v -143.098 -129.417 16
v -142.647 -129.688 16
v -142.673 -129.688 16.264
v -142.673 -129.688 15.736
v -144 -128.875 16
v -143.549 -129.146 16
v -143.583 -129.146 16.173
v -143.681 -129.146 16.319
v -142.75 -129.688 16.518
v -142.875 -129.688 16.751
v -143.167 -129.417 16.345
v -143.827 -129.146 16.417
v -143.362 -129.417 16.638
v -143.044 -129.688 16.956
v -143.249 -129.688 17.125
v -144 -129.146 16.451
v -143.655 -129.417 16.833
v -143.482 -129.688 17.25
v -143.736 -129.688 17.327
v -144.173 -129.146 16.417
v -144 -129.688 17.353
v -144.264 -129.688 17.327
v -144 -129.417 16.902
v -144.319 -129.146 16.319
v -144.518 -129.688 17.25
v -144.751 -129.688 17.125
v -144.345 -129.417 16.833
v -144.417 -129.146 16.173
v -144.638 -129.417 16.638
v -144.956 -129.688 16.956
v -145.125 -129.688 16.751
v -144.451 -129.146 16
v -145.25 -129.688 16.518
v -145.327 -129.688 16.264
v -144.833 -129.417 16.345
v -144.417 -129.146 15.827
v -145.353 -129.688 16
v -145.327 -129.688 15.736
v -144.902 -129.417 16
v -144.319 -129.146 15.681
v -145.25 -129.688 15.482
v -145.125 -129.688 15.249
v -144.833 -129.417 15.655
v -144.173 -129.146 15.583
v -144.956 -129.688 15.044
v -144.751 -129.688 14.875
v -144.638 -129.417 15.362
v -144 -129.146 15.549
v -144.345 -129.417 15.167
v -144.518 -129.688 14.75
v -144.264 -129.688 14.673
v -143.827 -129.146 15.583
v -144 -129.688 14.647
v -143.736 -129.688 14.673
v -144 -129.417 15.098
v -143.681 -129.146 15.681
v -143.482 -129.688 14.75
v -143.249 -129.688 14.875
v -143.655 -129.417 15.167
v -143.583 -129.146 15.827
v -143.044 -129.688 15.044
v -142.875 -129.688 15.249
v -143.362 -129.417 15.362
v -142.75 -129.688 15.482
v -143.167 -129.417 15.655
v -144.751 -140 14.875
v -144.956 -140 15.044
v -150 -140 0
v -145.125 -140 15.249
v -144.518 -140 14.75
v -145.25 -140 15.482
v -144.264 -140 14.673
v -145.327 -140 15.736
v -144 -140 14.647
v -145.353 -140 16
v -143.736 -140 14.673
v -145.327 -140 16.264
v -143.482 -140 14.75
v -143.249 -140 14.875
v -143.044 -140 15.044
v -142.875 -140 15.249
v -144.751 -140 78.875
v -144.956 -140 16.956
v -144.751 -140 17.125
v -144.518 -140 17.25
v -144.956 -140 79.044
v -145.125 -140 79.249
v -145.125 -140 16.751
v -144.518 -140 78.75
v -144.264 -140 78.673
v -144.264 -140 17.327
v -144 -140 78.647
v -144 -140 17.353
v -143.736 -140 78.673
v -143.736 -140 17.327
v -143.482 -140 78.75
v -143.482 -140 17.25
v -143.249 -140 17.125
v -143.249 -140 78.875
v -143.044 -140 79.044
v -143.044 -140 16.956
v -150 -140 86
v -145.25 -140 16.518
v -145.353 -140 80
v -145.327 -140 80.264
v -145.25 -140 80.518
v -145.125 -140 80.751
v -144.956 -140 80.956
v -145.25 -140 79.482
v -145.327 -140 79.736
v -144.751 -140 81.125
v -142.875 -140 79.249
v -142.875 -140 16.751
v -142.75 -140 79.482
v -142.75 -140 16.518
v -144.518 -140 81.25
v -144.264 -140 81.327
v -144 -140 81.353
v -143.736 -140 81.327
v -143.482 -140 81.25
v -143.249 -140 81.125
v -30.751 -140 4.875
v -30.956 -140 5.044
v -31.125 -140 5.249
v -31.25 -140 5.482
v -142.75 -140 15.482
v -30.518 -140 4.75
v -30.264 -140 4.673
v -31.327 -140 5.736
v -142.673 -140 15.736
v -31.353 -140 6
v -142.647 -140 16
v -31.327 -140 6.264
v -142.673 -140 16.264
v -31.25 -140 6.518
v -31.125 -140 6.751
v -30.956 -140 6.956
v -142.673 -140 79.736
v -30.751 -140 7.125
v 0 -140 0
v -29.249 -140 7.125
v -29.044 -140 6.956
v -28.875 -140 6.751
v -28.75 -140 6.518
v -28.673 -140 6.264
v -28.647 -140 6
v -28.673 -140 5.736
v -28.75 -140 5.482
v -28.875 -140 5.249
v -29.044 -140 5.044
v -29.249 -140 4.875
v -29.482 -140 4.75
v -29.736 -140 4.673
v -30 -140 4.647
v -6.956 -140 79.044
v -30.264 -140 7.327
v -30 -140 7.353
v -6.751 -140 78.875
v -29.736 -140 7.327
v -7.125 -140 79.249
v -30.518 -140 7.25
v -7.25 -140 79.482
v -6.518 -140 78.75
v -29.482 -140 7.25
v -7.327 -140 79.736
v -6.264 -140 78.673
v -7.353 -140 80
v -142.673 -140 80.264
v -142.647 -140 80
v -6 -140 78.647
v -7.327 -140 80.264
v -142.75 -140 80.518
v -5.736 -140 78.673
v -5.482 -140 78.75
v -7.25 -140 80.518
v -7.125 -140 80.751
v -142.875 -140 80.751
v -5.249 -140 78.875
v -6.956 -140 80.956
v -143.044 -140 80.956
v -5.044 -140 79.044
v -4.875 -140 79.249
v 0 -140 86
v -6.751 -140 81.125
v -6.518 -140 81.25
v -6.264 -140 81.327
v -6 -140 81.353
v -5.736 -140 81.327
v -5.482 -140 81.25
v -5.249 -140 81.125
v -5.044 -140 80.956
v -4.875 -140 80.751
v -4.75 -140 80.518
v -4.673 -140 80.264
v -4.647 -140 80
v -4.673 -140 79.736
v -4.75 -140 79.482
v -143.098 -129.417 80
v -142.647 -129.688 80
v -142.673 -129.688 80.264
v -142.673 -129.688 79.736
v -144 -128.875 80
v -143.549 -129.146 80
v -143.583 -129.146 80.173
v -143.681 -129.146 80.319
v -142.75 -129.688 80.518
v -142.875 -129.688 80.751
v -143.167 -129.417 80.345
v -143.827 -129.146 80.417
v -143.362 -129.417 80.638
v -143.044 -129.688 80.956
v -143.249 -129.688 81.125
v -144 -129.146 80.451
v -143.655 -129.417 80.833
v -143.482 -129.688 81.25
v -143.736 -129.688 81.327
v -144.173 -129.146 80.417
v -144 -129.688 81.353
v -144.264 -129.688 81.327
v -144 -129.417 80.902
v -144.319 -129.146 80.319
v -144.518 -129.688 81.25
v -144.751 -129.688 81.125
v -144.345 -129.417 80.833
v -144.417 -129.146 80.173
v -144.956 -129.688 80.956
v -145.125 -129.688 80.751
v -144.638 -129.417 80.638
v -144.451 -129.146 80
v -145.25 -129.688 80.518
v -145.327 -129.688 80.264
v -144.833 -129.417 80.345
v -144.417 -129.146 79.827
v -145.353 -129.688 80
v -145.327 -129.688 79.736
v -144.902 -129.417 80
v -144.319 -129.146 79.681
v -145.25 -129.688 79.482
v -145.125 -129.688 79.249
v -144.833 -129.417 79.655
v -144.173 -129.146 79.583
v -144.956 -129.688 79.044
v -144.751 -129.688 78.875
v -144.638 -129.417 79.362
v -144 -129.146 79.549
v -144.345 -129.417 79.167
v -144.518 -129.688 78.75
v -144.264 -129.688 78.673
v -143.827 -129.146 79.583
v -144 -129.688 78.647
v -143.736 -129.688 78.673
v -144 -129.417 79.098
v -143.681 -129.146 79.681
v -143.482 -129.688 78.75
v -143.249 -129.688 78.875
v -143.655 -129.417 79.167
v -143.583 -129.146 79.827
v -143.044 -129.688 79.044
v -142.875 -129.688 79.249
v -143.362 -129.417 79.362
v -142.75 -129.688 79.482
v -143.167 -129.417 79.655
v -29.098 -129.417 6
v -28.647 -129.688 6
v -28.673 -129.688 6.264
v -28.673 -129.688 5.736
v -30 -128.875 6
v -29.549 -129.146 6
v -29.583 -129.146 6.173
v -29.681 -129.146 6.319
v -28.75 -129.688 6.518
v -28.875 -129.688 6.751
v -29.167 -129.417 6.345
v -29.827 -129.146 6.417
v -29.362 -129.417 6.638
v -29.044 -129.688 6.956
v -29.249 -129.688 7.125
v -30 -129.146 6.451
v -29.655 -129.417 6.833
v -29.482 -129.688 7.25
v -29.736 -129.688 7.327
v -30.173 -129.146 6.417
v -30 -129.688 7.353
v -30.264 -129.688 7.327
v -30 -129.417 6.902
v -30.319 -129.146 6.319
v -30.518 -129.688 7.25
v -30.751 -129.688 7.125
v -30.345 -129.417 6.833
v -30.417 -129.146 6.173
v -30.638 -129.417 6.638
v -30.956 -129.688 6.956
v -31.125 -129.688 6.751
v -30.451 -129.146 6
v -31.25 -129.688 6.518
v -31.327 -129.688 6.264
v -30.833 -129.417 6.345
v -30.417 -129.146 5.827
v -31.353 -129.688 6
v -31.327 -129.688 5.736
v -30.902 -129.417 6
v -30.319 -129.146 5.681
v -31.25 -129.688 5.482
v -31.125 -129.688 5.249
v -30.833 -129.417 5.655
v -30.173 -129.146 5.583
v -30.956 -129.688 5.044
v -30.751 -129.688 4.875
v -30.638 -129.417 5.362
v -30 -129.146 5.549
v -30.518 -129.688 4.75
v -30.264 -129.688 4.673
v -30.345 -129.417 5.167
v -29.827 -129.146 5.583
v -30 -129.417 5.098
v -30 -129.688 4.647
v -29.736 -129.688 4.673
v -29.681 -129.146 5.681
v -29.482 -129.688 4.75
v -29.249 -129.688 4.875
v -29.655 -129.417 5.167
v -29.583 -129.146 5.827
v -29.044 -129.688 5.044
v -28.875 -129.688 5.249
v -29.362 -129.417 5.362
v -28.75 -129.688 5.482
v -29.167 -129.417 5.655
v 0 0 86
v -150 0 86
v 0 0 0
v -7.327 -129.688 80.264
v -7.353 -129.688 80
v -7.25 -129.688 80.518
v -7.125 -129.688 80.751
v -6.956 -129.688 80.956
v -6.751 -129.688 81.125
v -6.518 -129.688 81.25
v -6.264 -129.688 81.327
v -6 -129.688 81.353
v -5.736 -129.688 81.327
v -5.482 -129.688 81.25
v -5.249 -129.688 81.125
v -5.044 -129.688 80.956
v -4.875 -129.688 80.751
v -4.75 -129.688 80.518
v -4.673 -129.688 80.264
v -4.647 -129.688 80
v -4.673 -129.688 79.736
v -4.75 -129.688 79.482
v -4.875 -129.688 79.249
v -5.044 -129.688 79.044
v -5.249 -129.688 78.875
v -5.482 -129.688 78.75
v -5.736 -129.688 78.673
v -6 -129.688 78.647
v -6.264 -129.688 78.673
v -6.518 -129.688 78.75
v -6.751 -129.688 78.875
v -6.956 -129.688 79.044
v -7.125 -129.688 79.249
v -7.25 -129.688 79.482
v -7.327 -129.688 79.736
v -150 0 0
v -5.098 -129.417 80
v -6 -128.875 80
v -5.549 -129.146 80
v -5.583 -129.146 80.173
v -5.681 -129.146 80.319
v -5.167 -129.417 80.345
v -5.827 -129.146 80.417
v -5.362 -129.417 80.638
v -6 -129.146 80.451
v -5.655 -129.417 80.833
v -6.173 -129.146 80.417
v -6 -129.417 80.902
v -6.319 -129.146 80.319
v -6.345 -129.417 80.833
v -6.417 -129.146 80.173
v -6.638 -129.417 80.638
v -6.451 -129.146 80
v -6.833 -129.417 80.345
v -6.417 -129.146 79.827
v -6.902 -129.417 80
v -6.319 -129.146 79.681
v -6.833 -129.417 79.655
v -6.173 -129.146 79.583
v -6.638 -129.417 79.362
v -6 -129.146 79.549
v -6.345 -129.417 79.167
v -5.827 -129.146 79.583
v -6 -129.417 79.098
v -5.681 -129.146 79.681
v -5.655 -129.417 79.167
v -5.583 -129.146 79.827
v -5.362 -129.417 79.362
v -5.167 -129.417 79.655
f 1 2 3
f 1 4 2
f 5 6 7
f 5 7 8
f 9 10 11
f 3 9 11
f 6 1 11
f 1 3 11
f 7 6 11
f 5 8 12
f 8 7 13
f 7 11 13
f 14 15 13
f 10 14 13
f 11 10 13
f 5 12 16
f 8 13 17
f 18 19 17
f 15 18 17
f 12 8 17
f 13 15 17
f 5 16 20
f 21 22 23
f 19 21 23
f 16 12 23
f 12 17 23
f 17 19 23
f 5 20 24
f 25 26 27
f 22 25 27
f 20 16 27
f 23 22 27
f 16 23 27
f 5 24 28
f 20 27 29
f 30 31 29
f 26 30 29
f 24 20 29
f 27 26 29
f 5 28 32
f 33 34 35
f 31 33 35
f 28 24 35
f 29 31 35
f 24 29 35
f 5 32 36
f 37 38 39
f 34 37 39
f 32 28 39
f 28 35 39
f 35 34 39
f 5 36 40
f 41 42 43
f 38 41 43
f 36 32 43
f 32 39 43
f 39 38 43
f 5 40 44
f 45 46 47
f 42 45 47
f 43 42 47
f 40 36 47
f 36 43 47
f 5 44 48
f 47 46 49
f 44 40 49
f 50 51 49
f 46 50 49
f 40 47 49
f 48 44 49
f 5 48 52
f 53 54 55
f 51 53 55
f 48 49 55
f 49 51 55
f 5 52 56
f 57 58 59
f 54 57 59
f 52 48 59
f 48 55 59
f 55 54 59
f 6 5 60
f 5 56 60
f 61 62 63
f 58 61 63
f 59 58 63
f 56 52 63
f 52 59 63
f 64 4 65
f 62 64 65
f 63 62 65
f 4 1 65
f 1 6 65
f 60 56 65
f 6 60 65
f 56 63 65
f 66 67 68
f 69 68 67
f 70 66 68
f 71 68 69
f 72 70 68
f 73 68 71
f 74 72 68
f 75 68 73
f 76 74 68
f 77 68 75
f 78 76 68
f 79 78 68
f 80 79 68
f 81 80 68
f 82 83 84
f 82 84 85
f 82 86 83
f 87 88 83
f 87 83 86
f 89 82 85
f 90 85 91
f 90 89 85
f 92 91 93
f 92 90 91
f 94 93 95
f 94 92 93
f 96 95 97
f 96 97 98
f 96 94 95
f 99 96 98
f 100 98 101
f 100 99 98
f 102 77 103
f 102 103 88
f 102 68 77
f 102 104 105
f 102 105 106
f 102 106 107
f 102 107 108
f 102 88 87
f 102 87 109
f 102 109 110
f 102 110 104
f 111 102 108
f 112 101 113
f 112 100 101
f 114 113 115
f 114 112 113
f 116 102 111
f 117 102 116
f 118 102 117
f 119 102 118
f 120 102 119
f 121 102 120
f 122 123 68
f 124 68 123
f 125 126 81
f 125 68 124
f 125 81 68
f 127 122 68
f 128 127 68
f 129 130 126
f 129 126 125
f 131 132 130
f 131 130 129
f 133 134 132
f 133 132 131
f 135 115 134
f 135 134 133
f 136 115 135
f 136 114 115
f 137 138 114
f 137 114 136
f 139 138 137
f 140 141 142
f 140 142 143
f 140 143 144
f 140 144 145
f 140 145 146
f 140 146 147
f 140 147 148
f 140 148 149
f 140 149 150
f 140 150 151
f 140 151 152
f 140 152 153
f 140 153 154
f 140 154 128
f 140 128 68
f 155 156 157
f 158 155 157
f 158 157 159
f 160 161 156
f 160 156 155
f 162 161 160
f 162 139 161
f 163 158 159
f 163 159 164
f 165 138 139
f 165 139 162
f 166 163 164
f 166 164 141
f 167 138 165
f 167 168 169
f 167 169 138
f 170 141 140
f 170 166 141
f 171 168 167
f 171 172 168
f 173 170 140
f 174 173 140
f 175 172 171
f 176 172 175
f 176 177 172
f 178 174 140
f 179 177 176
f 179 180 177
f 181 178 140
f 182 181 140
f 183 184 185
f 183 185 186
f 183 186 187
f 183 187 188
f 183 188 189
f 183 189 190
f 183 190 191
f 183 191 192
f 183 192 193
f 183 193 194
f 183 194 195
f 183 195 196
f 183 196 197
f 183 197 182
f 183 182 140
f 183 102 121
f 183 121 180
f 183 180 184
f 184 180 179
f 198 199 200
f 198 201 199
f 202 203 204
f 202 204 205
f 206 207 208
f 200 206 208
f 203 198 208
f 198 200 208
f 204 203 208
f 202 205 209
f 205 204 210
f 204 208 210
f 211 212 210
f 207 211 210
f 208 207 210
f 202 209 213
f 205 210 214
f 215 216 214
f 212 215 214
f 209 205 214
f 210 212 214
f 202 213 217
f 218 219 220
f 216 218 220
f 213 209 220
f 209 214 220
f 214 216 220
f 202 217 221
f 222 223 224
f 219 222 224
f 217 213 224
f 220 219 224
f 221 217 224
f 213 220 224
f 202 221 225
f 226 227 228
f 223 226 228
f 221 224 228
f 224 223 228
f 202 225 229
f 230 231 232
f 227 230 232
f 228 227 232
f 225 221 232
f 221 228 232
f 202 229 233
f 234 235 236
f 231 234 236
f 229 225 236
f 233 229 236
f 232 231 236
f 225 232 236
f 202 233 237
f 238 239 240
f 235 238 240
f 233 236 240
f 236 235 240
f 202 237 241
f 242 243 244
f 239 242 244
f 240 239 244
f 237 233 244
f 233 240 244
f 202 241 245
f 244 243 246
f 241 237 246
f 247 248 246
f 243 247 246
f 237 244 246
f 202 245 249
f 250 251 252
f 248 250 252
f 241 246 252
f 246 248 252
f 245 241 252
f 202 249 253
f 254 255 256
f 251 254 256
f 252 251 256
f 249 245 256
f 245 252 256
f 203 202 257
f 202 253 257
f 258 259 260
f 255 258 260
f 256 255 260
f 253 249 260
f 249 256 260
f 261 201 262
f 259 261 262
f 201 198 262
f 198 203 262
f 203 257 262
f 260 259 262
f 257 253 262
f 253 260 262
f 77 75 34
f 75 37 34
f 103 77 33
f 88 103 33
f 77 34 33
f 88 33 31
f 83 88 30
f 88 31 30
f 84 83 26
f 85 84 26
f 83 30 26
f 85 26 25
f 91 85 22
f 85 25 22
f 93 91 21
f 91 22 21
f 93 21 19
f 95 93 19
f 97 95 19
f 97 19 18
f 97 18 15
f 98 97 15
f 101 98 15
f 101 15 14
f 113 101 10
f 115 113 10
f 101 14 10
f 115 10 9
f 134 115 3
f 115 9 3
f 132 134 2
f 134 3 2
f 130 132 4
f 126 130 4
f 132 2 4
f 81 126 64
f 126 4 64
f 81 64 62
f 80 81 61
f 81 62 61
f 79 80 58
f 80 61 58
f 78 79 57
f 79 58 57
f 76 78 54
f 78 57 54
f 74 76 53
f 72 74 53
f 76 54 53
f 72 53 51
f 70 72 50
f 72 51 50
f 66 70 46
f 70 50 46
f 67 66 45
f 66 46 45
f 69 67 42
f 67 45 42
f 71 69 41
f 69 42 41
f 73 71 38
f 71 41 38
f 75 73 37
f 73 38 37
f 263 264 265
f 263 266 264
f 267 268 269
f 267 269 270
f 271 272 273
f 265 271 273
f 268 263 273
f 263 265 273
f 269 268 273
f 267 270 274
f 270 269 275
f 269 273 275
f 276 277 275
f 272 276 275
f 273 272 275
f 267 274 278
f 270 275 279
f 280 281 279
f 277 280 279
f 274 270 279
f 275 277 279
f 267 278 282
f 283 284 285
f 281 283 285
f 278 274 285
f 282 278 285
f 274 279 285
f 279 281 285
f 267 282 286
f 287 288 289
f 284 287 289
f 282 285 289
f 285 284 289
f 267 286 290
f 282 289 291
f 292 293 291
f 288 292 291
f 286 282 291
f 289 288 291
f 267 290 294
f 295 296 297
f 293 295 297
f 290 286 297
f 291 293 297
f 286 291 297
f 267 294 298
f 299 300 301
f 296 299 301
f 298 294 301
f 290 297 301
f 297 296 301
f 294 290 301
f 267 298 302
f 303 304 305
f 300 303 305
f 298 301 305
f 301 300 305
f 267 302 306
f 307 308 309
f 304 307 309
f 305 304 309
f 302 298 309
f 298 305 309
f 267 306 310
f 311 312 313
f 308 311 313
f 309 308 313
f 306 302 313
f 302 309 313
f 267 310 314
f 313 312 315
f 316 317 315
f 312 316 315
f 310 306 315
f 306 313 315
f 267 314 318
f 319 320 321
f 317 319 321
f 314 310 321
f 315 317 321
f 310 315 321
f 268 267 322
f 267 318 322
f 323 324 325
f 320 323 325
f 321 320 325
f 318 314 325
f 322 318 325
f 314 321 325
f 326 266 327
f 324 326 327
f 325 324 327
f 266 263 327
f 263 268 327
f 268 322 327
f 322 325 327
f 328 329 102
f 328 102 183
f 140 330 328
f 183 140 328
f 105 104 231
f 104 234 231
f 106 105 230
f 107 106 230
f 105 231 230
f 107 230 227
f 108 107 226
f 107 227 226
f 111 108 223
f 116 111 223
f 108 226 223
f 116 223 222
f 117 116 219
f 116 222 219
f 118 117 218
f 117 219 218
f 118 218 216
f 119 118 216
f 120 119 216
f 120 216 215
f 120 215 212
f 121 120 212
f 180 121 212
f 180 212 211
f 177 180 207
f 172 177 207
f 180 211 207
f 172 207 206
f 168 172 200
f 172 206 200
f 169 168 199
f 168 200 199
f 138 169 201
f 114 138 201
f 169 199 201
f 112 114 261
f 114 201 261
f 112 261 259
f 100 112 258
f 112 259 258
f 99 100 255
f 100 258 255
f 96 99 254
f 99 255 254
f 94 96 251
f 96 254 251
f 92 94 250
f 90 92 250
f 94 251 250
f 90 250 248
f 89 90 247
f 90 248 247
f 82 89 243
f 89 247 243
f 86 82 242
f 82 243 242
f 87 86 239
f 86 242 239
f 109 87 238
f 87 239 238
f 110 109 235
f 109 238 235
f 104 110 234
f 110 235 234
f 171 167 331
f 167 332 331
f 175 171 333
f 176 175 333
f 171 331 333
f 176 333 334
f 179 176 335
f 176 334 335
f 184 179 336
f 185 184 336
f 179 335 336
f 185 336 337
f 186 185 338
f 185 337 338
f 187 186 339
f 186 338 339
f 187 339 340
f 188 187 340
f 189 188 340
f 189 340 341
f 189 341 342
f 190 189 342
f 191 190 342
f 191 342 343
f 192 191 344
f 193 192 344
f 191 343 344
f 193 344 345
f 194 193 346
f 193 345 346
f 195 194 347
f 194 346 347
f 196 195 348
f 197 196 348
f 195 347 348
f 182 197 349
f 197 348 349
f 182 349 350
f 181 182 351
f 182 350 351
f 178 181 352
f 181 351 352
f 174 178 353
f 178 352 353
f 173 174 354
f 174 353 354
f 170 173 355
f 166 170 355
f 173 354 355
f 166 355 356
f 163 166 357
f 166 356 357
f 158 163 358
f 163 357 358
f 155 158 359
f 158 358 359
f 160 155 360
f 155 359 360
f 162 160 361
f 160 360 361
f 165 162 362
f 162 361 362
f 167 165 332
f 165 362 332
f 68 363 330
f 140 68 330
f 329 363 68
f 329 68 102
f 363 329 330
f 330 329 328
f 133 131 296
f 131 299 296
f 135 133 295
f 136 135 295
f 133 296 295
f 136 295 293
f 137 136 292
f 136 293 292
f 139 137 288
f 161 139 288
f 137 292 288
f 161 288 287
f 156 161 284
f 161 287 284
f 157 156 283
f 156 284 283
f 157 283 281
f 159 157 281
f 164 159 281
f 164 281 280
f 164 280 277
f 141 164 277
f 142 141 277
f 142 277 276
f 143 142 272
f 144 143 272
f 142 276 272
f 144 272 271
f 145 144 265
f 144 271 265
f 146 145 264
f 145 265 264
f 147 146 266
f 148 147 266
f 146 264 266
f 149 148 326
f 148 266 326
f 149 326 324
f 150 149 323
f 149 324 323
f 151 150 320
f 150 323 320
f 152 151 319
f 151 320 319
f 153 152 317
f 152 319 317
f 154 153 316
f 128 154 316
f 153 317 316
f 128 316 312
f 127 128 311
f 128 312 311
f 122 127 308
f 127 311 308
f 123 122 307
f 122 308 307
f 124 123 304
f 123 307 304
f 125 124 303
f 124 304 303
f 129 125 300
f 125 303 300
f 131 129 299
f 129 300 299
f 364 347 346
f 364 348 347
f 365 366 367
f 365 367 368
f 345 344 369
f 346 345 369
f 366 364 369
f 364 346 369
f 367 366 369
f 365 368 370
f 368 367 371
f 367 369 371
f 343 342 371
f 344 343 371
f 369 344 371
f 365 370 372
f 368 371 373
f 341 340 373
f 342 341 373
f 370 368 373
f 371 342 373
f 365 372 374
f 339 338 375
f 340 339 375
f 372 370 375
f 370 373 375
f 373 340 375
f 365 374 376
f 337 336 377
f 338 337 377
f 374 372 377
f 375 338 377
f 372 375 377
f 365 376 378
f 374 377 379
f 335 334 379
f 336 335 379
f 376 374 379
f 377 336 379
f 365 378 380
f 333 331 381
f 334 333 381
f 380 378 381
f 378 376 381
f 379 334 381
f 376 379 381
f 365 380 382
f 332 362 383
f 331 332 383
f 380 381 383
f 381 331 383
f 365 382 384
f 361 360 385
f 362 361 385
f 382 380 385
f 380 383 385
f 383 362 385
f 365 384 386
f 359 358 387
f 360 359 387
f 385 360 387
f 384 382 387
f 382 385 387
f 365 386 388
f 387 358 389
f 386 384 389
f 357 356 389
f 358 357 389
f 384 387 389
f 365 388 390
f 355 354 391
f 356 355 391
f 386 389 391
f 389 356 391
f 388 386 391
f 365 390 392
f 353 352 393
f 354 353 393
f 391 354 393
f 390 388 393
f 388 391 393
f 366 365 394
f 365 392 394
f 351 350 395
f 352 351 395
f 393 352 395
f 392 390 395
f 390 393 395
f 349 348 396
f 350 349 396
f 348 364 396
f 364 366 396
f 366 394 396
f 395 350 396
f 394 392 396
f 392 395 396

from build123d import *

# Parameters (mm, degrees)
F0_W     = 150
F0_H     = 86
F1_DEPTH = 140
F3_D     = 2.7051
F3_DEPTH = 10.3124
F3_TIP   = 0.8126940303


with BuildPart() as f1:
    # F0 (on Front) → F1 (new body)
    with BuildSketch(Plane.XZ):
        with Locations((-75, 43)):
            Rectangle(F0_W, F0_H)
    extrude(amount=F1_DEPTH)

    # F3
    with Locations(Plane.XZ.offset(140)):
        with Locations((-144, 80), (-30, 6), (-6, 80), (-144, 16)):
            Hole(F3_D / 2, depth=F3_DEPTH)
            with Locations((0, 0, -(F3_DEPTH + F3_TIP / 2))):  # 118° drill point
                Cone(0, F3_D / 2, F3_TIP, mode=Mode.SUBTRACT)


solid = f1.part
